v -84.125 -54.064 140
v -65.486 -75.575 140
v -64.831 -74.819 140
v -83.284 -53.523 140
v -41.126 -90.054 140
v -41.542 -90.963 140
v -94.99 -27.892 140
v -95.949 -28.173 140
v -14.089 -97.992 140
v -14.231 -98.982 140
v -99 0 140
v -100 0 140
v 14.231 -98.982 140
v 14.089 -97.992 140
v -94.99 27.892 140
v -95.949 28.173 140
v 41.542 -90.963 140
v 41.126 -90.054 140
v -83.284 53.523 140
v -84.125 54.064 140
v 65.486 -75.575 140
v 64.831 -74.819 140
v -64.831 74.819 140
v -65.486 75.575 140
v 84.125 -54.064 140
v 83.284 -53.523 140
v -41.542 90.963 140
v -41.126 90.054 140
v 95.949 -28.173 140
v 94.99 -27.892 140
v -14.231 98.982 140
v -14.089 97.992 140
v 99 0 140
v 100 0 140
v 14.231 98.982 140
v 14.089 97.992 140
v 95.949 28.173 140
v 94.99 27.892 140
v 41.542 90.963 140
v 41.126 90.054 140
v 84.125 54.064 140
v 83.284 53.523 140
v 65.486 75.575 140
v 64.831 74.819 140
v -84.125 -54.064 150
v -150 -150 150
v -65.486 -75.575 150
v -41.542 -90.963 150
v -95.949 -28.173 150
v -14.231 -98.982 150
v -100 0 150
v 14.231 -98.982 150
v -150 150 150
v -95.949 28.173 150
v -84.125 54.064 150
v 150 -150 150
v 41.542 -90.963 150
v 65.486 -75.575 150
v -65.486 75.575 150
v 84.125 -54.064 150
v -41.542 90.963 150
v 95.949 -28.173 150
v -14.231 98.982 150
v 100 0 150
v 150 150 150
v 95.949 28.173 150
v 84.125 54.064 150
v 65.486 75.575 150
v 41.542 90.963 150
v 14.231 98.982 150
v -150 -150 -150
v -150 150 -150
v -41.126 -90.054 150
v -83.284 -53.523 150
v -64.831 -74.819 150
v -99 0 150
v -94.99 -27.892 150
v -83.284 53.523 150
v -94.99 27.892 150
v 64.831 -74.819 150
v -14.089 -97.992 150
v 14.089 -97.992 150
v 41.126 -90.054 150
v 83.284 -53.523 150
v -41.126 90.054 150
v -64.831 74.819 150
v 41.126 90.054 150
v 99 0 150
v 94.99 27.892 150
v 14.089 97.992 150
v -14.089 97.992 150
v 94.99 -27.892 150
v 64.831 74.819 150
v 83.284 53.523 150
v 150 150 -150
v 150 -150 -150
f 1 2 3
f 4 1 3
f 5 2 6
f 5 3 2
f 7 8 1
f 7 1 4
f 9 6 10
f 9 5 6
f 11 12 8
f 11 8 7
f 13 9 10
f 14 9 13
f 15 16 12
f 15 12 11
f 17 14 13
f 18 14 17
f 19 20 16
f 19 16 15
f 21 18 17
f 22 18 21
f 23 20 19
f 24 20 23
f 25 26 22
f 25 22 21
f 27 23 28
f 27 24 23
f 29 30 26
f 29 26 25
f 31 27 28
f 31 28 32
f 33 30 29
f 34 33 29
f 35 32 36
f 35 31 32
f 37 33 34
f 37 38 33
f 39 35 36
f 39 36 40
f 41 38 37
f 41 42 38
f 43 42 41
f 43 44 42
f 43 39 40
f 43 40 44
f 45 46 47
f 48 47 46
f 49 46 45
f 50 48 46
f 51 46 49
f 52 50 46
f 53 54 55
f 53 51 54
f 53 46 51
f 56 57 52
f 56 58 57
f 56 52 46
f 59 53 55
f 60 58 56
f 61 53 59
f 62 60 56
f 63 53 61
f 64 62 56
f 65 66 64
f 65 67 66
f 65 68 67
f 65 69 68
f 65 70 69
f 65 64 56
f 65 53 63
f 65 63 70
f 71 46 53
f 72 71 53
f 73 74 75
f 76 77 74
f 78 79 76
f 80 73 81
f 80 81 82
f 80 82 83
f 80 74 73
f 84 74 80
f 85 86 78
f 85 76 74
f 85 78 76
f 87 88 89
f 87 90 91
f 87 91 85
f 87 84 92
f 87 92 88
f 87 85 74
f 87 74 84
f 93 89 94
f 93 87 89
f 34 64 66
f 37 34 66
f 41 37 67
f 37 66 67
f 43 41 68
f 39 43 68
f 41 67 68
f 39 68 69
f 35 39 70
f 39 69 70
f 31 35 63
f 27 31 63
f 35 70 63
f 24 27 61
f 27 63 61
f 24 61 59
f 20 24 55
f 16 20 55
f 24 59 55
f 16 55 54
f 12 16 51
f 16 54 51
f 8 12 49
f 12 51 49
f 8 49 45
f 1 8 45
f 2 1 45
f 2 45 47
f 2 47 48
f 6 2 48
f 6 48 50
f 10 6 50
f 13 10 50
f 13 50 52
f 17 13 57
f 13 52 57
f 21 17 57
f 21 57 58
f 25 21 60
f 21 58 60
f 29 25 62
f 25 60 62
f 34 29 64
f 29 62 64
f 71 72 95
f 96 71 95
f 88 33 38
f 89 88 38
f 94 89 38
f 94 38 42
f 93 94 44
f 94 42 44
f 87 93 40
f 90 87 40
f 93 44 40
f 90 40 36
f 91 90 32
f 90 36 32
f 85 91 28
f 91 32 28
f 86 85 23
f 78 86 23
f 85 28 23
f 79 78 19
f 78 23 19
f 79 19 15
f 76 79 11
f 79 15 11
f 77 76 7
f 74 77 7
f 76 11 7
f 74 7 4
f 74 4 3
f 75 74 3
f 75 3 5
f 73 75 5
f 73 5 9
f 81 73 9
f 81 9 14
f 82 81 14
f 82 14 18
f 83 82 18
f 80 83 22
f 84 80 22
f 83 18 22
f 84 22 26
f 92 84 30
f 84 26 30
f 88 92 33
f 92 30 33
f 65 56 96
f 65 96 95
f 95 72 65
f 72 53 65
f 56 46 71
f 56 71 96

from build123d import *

# Parameters (mm, degrees)
F0_W     = 300
F0_H     = 300
F1_DEPTH = 150
F2_R     = 100
F3_DEPTH = 10
F4_R     = 99
F5_DEPTH = 10


with BuildPart() as f1:
    # F0 (on Top) → F1 (new body, symmetric)
    with BuildSketch(Plane.XY):
        Rectangle(F0_W, F0_H)
    extrude(amount=F1_DEPTH, both=True)

    # F2 (on face) → F3 (cut)
    with BuildSketch(Plane.XY.offset(150)):
        Circle(F2_R)
    extrude(amount=-F3_DEPTH, mode=Mode.SUBTRACT)

    # F4 (on face) → F5 (join)
    with BuildSketch(Plane.XY.offset(140)):
        Circle(F4_R)
    extrude(amount=F5_DEPTH)


solid = f1.part
